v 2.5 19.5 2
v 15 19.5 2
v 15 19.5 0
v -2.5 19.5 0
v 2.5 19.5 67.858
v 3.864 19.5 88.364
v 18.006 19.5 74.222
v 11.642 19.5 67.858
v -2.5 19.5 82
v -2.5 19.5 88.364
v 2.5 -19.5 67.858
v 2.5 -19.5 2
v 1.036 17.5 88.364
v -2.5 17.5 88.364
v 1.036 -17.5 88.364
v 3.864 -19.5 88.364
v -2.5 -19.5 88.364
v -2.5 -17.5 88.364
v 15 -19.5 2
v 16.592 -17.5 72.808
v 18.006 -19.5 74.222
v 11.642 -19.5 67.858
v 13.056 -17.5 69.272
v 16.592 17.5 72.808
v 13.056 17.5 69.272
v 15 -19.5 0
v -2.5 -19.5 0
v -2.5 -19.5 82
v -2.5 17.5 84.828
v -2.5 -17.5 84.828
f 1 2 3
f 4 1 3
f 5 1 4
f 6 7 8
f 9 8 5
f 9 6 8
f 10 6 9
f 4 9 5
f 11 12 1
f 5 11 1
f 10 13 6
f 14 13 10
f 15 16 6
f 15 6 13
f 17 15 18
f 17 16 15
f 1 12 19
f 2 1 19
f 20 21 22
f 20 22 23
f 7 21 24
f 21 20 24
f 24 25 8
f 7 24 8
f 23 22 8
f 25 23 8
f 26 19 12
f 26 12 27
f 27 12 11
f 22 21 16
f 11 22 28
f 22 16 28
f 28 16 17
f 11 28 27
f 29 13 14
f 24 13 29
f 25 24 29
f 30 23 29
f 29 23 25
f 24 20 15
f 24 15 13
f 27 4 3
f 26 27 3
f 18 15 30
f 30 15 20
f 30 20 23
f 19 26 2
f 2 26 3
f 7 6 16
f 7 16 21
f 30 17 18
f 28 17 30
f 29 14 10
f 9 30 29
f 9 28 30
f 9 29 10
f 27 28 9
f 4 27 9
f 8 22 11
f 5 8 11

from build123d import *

# Parameters (mm, degrees)
SKETCH1_W           = 30
SKETCH1_H           = 39
BOSS_EXTRUDE1_DEPTH = 2
SKETCH2_W           = 5
SKETCH2_H           = 39
BOSS_EXTRUDE2_DEPTH = 80
CUT_EXTRUDE1_DEPTH  = 39
SKETCH4_W           = 20
SKETCH4_H           = 39
BOSS_EXTRUDE3_DEPTH = 9
SKETCH5_W           = 5
SKETCH5_H           = 35
CUT_EXTRUDE2_DEPTH  = 30
SKETCH6_W           = 12.5
SKETCH6_H           = 39
CUT_EXTRUDE3_DEPTH  = 2
BOSS_EXTRUDE4_DEPTH = 39
BOSS_EXTRUDE5_DEPTH = 39
SKETCH10_W          = 5
SKETCH10_H          = 35
CUT_EXTRUDE4_DEPTH  = 10


with BuildPart() as part:
    # Sketch1 → Boss-Extrude1 (new body)
    with BuildSketch(Plane.XY):
        Rectangle(SKETCH1_W, SKETCH1_H)
    extrude(amount=BOSS_EXTRUDE1_DEPTH)

    # Sketch2 → Boss-Extrude2 (add)
    with BuildSketch(Plane.XY.offset(2)):
        Rectangle(SKETCH2_W, SKETCH2_H)
    extrude(amount=BOSS_EXTRUDE2_DEPTH)

    # Sketch3 → Cut-Extrude1 (cut)
    with BuildSketch(Plane.XZ.offset(19.5)):
        Polygon((-2.5, 82), (2.5, 82), (2.5, 77), align=None)
    extrude(amount=-CUT_EXTRUDE1_DEPTH, mode=Mode.SUBTRACT)

    # Sketch4 → Boss-Extrude3 (add)
    with BuildSketch(Plane(origin=(39.75, 0, 39.75), x_dir=(0.707106781, 0, -0.707106781), z_dir=(0.707106781, 0, 0.707106781))):
        with Locations((-49.75052301, 0)):
            Rectangle(SKETCH4_W, SKETCH4_H)
    extrude(amount=BOSS_EXTRUDE3_DEPTH)

    # Sketch5 → Cut-Extrude2 (cut)
    with BuildSketch(Plane(origin=(-28.107864376, 0, 28.107864376), x_dir=(-0.707106781, 0, -0.707106781), z_dir=(0.707106781, 0, -0.707106781))):
        with Locations((-60.714989104, 0)):
            Rectangle(SKETCH5_W, SKETCH5_H)
    extrude(amount=-CUT_EXTRUDE2_DEPTH, mode=Mode.SUBTRACT)

    # Sketch6 → Cut-Extrude3 (cut)
    with BuildSketch(Plane.XY.offset(2)):
        with Locations((-8.75, 0)):
            Rectangle(SKETCH6_W, SKETCH6_H)
    extrude(amount=-CUT_EXTRUDE3_DEPTH, mode=Mode.SUBTRACT)

    # Sketch7 → Boss-Extrude4 (add)
    with BuildSketch(Plane.XZ.offset(19.5)):
        Polygon((-2.5, 82), (3.863961031, 88.363961031), (-2.5, 88.363961031), align=None)
    extrude(amount=-BOSS_EXTRUDE4_DEPTH)

    # Sketch8 → Boss-Extrude5 (add)
    with BuildSketch(Plane.XZ.offset(19.5)):
        Polygon((2.5, 77), (11.642135624, 67.857864376), (2.5, 67.857864376), align=None)
    extrude(amount=-BOSS_EXTRUDE5_DEPTH)

    # Sketch10 → Cut-Extrude4 (cut)
    with BuildSketch(Plane(origin=(-42.25, 0, 42.25), x_dir=(-0.707106781, 0, -0.707106781), z_dir=(0.707106781, 0, -0.707106781))):
        with Locations((-60.714989104, 0)):
            Rectangle(SKETCH10_W, SKETCH10_H)
    extrude(amount=-CUT_EXTRUDE4_DEPTH, mode=Mode.SUBTRACT)


solid = part.part
